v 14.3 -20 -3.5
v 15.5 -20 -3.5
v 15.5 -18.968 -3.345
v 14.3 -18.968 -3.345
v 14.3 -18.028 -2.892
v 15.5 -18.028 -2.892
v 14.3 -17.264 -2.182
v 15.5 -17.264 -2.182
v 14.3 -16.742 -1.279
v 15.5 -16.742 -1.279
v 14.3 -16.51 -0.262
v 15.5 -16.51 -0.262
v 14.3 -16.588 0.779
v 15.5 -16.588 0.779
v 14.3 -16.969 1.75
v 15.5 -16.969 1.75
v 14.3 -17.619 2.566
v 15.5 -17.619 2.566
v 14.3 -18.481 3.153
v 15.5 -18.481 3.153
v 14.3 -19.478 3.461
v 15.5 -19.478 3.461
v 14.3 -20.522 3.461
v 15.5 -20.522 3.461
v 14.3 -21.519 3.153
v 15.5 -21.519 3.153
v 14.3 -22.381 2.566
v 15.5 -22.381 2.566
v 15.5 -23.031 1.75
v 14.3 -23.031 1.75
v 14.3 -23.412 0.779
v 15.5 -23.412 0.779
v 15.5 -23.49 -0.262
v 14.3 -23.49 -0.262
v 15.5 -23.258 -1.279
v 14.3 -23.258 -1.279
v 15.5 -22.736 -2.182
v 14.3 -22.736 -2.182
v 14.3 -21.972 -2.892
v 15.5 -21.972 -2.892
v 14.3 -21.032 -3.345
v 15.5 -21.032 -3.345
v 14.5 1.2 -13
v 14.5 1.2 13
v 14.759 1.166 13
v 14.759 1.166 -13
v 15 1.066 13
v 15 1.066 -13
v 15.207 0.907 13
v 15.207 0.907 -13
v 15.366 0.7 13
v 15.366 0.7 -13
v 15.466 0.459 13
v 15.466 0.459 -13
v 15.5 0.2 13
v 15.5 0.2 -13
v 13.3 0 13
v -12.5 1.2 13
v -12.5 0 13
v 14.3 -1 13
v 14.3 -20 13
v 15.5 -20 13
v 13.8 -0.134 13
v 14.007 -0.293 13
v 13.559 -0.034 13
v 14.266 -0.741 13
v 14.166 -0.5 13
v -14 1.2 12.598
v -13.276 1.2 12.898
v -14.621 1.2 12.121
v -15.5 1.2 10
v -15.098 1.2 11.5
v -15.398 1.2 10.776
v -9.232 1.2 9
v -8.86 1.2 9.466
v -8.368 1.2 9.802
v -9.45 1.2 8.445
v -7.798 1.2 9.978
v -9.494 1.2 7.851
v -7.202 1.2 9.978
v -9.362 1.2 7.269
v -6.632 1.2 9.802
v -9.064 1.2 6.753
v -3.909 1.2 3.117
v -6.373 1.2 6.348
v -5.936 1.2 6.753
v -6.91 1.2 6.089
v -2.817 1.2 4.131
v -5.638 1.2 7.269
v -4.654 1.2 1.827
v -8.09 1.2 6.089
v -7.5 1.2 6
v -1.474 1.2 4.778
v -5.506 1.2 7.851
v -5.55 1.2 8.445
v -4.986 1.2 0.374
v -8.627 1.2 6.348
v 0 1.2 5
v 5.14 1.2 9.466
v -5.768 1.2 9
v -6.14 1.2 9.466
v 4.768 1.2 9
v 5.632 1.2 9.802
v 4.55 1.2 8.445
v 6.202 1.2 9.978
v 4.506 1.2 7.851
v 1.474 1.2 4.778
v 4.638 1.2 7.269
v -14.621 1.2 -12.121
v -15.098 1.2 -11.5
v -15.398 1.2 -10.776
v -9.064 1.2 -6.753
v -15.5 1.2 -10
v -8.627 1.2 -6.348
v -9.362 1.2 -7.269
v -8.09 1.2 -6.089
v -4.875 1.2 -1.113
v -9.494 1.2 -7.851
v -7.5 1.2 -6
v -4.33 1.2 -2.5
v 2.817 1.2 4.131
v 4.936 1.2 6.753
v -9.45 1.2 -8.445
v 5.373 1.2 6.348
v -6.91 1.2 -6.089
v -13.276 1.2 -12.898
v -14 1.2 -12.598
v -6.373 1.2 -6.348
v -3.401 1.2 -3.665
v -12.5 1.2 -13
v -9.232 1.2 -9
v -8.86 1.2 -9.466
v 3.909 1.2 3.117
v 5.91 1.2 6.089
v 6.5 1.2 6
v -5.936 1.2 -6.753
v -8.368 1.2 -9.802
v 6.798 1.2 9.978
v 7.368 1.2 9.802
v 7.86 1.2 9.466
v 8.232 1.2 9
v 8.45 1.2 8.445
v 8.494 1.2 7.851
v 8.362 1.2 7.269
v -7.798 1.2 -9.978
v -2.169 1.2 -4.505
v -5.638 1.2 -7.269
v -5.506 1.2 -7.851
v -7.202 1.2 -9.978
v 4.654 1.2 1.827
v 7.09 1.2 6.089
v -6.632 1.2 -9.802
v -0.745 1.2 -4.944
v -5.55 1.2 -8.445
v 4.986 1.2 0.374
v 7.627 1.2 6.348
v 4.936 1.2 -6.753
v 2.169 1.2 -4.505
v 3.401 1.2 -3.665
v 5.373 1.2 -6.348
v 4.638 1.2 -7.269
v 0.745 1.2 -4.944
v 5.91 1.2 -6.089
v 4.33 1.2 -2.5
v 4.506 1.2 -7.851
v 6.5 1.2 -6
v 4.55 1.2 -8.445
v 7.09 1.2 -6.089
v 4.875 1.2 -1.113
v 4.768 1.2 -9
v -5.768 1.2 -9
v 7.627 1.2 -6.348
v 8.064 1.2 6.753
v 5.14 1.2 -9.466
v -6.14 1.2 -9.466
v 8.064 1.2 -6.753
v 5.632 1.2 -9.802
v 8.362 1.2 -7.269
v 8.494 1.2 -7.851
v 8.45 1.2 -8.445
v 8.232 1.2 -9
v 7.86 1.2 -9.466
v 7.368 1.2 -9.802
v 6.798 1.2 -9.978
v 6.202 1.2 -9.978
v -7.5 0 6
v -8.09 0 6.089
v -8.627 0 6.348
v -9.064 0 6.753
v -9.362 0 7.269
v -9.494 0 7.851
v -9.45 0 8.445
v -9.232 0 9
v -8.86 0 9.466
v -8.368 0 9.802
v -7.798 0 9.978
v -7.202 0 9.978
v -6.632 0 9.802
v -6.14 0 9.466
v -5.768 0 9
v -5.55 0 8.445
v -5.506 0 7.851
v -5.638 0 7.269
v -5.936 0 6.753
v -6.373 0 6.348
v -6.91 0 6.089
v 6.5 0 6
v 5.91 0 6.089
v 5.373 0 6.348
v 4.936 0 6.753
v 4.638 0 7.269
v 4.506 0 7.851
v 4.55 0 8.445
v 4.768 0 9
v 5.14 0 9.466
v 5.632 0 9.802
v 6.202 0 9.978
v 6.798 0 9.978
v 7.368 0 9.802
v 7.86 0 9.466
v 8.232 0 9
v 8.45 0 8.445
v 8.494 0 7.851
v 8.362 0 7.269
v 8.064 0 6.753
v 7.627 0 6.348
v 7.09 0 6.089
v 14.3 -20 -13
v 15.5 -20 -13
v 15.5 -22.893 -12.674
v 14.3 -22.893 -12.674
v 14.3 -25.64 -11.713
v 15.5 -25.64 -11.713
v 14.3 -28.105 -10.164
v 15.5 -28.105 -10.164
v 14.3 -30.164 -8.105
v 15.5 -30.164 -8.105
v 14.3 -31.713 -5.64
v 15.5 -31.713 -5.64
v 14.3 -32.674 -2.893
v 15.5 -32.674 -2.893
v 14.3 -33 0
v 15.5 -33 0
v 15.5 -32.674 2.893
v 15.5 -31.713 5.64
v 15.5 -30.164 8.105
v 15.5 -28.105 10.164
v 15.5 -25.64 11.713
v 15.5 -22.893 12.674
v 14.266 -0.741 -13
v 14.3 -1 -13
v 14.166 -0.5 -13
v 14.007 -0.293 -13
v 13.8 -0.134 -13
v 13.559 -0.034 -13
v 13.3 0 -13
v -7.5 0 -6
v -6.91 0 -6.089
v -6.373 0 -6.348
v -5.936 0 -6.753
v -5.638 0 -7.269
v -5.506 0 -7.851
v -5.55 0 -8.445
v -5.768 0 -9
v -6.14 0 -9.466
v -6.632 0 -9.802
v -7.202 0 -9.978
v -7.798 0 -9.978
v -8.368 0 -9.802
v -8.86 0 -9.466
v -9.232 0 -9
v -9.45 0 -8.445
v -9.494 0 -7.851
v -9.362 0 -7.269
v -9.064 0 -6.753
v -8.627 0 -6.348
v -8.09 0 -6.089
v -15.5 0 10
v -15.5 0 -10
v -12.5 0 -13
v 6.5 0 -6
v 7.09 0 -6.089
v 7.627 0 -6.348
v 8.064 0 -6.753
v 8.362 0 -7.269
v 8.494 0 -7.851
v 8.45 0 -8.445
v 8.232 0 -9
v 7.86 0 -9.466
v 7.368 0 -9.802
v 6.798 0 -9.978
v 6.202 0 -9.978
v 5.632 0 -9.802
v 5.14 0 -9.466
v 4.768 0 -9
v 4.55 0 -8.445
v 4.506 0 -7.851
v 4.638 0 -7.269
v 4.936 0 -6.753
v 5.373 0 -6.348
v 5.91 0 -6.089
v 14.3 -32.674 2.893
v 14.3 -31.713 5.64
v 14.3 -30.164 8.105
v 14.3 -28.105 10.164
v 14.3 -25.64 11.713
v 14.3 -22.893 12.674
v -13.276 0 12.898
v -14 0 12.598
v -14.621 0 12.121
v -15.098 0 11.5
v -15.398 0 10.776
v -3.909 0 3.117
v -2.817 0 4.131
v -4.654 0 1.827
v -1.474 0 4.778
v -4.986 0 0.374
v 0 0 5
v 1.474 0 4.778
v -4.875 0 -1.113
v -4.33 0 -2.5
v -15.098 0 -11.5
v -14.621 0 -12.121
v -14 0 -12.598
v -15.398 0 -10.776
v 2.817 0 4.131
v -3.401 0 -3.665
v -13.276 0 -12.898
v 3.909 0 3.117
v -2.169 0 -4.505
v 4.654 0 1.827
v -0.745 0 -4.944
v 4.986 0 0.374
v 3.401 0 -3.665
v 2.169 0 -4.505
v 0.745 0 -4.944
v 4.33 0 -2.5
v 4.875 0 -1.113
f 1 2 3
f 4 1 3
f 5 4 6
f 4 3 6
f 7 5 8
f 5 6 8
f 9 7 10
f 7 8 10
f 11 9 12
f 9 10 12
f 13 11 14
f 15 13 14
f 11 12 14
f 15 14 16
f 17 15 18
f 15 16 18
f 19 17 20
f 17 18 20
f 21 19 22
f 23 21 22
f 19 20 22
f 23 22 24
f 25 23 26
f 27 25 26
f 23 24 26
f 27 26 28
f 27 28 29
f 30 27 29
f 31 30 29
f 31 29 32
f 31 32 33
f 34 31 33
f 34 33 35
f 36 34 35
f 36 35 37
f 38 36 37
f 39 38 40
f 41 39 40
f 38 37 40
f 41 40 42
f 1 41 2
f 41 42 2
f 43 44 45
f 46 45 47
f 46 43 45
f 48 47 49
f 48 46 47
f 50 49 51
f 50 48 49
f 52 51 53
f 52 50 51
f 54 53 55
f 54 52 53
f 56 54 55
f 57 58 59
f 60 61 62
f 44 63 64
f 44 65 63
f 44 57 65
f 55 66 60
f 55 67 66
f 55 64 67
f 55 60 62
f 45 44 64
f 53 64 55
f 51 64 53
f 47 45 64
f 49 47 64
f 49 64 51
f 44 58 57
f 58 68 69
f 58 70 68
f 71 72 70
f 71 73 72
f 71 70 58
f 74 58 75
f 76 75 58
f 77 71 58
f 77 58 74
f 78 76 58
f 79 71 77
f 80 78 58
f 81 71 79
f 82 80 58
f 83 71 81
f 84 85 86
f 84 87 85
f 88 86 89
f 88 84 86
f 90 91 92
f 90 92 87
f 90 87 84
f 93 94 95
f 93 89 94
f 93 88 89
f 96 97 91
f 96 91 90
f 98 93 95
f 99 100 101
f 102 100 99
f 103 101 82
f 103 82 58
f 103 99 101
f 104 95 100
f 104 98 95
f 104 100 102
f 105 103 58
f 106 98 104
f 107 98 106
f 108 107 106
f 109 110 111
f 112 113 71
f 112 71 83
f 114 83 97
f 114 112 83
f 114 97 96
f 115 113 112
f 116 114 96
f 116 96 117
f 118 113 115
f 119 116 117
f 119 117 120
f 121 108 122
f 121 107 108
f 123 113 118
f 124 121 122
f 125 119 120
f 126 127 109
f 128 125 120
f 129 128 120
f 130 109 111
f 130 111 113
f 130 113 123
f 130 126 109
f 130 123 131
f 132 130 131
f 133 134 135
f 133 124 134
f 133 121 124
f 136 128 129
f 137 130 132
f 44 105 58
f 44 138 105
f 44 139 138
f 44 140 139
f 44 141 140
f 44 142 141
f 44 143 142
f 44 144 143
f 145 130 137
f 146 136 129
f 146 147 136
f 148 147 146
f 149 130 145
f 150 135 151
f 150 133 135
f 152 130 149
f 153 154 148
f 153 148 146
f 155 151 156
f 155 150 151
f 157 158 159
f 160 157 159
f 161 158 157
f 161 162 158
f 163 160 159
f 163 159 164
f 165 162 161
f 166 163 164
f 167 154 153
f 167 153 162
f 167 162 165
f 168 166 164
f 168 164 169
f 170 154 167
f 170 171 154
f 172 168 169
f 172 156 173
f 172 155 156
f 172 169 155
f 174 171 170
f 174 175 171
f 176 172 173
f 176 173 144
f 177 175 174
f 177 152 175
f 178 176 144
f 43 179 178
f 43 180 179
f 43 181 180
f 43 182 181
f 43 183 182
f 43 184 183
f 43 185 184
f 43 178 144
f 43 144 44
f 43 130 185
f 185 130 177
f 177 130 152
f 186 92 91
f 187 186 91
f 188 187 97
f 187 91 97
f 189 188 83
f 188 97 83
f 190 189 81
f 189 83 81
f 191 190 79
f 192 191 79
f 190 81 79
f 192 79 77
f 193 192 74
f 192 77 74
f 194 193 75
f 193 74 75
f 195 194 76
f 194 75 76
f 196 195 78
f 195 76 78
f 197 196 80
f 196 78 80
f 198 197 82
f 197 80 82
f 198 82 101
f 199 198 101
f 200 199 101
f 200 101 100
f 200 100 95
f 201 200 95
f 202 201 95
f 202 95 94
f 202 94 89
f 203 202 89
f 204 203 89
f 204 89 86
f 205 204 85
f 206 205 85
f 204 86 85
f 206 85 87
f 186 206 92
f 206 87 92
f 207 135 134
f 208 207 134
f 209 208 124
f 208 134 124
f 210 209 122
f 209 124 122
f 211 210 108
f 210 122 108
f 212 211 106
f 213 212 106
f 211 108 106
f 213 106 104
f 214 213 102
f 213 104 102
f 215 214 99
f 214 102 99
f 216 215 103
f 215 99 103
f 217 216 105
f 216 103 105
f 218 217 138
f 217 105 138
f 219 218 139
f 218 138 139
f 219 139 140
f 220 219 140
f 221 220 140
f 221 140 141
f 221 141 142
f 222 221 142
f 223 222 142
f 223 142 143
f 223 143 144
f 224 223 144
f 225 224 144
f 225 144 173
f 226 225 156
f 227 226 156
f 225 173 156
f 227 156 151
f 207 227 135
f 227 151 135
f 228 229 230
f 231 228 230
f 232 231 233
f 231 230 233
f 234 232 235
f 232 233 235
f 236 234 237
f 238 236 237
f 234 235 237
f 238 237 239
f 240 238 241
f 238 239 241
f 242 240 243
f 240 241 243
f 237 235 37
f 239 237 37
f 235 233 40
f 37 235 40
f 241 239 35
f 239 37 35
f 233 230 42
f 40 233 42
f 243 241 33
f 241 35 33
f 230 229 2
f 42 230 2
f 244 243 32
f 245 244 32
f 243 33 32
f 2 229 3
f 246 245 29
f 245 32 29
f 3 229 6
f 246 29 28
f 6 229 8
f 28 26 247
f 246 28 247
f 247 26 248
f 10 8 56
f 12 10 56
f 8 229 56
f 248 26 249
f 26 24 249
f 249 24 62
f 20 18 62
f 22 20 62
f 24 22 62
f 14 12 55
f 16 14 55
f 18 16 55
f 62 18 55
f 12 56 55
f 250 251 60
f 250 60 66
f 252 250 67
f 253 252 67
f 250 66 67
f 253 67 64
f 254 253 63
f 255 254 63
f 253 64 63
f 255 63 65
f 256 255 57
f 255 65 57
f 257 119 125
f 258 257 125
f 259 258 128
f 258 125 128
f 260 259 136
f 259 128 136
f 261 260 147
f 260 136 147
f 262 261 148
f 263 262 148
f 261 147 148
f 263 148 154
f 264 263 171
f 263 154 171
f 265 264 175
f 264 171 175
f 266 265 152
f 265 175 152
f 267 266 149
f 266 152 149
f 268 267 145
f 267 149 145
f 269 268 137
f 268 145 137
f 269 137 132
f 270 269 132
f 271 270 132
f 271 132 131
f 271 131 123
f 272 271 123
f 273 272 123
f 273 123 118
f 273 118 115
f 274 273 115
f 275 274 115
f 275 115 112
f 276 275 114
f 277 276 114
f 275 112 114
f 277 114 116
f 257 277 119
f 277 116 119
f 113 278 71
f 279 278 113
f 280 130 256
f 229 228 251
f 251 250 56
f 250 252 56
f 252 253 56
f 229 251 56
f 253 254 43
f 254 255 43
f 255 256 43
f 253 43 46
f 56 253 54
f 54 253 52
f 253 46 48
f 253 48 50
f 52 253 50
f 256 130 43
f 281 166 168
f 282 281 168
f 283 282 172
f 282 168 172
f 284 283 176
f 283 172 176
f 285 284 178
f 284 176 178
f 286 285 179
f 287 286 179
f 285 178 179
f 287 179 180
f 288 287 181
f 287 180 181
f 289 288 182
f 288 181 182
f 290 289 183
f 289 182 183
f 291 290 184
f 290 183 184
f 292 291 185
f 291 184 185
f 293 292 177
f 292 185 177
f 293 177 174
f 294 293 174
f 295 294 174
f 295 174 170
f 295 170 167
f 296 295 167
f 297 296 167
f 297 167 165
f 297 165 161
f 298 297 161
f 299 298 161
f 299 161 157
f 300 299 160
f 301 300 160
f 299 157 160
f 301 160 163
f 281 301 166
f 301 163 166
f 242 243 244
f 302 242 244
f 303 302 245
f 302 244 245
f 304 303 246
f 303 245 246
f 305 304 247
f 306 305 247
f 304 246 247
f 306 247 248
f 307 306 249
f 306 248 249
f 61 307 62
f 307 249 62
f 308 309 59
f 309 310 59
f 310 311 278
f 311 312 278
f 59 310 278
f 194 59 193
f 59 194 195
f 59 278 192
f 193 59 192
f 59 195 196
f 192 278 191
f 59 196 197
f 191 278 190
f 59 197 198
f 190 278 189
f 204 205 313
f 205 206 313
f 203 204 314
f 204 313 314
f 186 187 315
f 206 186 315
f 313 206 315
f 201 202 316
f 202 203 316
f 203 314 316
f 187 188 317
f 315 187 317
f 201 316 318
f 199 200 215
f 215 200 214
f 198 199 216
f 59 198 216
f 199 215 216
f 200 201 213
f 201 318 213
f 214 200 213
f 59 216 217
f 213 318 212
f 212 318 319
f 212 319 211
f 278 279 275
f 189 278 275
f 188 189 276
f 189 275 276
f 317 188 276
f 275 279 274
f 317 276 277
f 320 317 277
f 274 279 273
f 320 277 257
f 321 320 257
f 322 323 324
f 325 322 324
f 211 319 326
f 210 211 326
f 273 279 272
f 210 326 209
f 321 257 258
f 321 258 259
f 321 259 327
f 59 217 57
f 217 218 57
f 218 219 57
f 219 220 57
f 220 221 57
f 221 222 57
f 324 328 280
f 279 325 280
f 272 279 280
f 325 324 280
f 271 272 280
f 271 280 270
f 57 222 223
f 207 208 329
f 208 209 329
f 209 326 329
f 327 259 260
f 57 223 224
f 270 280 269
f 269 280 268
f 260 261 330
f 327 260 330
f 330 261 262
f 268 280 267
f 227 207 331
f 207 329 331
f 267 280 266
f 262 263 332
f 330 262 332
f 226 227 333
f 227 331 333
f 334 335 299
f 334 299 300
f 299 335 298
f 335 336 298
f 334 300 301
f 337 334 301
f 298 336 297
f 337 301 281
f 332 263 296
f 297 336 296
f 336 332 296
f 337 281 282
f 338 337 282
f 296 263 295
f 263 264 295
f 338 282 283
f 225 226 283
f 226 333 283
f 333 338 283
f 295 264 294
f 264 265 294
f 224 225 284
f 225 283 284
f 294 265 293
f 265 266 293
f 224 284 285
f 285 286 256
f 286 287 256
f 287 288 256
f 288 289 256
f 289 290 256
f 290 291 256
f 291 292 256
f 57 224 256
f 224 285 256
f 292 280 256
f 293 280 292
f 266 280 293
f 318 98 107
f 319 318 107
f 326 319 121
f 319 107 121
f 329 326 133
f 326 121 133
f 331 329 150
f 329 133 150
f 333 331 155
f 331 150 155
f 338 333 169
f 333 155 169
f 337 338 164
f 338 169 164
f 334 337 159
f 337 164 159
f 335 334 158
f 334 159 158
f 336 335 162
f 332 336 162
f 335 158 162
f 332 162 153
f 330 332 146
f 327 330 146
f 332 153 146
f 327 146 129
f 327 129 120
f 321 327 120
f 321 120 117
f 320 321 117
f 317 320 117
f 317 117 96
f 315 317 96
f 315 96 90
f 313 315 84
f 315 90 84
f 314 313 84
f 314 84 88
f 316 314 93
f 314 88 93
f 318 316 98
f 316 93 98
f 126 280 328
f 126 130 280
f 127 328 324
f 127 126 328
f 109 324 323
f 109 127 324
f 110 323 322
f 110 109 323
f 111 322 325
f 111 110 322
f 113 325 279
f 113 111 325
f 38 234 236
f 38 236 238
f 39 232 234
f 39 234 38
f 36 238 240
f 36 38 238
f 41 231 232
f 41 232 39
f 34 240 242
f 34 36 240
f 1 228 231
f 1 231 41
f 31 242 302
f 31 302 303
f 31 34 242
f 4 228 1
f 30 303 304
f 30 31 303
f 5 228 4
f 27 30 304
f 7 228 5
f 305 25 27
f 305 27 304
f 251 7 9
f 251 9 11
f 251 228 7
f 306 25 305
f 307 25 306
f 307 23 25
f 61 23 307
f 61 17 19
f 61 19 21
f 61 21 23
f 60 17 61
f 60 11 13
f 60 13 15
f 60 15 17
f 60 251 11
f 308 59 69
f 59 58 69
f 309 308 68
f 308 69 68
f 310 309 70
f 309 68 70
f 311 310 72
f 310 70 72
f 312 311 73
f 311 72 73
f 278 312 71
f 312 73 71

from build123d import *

# Parameters (mm, degrees)
SKETCH1_W           = 31
SKETCH1_H           = 26
BOSS_EXTRUDE1_DEPTH = 1.2
SKETCH3_W           = 1.2
SKETCH3_H           = 26
BOSS_EXTRUDE2_DEPTH = 33
SKETCH4_R           = 3.5
CUT_EXTRUDE1_DEPTH  = 1.2
SKETCH2_R           = 5
SKETCH2_R_2         = 2
CUT_EXTRUDE2_DEPTH  = 1.2
FILLET1_R           = 1
FILLET2_R           = 3


with BuildPart() as part:
    # Sketch1 → Boss-Extrude1 (new body)
    with BuildSketch(Plane(origin=(0, 0, 0), x_dir=(1, 0, 0), z_dir=(0, 1, 0))):
        Rectangle(SKETCH1_W, SKETCH1_H)
    extrude(amount=BOSS_EXTRUDE1_DEPTH)

    # Sketch3 → Boss-Extrude2 (add)
    with BuildSketch(Plane.XZ):
        with Locations((14.9, 0)):
            Rectangle(SKETCH3_W, SKETCH3_H)
    extrude(amount=BOSS_EXTRUDE2_DEPTH)

    # Sketch4 → Cut-Extrude1 (cut)
    with BuildSketch(Plane(origin=(15.5, 0, 0), x_dir=(0, 0, -1), z_dir=(1, 0, 0))):
        with BuildLine():
            Line((13, -33), (13, -20))
            ThreePointArc((13, -20), (9.192388155, -29.192388155), (0, -33))
            Line((0, -33), (13, -33))
        make_face()
        with BuildLine():
            Line((-13, -33), (0, -33))
            ThreePointArc((0, -33), (-9.192388155, -29.192388155), (-13, -20))
            Line((-13, -20), (-13, -33))
        make_face()
        with Locations((0, -20)):
            Circle(SKETCH4_R)
    extrude(amount=-CUT_EXTRUDE1_DEPTH, mode=Mode.SUBTRACT)

    # Sketch2 → Cut-Extrude2 (cut)
    with BuildSketch(Plane(origin=(0, 1.2, 0), x_dir=(1, 0, 0), z_dir=(0, 1, 0))):
        with Locations(Location((0, 0, 0), (0, 0, 270))):
            Circle(SKETCH2_R)
        with Locations(Location((-7.5, 8, 0), (0, 0, 270))):
            Circle(SKETCH2_R_2)
        with Locations(Location((6.5, 8, 0), (0, 0, 270))):
            Circle(SKETCH2_R_2)
        with Locations(Location((6.5, -8, 0), (0, 0, 90))):
            Circle(SKETCH2_R_2)
        with Locations(Location((-7.5, -8, 0), (0, 0, 90))):
            Circle(SKETCH2_R_2)
    extrude(amount=-CUT_EXTRUDE2_DEPTH, mode=Mode.SUBTRACT)

    # Fillet1
    fillet1_edges = [part.edges().sort_by_distance(p)[0] for p in [
        (15.5, 1.2, 0),
        (14.3, 0, 0),
    ]]
    fillet(fillet1_edges, radius=FILLET1_R)

    # Fillet2
    fillet2_edges = [part.edges().sort_by_distance(p)[0] for p in [
        (-15.5, 0.6, -13),
        (-15.5, 0.6, 13),
    ]]
    fillet(fillet2_edges, radius=FILLET2_R)


solid = part.part
